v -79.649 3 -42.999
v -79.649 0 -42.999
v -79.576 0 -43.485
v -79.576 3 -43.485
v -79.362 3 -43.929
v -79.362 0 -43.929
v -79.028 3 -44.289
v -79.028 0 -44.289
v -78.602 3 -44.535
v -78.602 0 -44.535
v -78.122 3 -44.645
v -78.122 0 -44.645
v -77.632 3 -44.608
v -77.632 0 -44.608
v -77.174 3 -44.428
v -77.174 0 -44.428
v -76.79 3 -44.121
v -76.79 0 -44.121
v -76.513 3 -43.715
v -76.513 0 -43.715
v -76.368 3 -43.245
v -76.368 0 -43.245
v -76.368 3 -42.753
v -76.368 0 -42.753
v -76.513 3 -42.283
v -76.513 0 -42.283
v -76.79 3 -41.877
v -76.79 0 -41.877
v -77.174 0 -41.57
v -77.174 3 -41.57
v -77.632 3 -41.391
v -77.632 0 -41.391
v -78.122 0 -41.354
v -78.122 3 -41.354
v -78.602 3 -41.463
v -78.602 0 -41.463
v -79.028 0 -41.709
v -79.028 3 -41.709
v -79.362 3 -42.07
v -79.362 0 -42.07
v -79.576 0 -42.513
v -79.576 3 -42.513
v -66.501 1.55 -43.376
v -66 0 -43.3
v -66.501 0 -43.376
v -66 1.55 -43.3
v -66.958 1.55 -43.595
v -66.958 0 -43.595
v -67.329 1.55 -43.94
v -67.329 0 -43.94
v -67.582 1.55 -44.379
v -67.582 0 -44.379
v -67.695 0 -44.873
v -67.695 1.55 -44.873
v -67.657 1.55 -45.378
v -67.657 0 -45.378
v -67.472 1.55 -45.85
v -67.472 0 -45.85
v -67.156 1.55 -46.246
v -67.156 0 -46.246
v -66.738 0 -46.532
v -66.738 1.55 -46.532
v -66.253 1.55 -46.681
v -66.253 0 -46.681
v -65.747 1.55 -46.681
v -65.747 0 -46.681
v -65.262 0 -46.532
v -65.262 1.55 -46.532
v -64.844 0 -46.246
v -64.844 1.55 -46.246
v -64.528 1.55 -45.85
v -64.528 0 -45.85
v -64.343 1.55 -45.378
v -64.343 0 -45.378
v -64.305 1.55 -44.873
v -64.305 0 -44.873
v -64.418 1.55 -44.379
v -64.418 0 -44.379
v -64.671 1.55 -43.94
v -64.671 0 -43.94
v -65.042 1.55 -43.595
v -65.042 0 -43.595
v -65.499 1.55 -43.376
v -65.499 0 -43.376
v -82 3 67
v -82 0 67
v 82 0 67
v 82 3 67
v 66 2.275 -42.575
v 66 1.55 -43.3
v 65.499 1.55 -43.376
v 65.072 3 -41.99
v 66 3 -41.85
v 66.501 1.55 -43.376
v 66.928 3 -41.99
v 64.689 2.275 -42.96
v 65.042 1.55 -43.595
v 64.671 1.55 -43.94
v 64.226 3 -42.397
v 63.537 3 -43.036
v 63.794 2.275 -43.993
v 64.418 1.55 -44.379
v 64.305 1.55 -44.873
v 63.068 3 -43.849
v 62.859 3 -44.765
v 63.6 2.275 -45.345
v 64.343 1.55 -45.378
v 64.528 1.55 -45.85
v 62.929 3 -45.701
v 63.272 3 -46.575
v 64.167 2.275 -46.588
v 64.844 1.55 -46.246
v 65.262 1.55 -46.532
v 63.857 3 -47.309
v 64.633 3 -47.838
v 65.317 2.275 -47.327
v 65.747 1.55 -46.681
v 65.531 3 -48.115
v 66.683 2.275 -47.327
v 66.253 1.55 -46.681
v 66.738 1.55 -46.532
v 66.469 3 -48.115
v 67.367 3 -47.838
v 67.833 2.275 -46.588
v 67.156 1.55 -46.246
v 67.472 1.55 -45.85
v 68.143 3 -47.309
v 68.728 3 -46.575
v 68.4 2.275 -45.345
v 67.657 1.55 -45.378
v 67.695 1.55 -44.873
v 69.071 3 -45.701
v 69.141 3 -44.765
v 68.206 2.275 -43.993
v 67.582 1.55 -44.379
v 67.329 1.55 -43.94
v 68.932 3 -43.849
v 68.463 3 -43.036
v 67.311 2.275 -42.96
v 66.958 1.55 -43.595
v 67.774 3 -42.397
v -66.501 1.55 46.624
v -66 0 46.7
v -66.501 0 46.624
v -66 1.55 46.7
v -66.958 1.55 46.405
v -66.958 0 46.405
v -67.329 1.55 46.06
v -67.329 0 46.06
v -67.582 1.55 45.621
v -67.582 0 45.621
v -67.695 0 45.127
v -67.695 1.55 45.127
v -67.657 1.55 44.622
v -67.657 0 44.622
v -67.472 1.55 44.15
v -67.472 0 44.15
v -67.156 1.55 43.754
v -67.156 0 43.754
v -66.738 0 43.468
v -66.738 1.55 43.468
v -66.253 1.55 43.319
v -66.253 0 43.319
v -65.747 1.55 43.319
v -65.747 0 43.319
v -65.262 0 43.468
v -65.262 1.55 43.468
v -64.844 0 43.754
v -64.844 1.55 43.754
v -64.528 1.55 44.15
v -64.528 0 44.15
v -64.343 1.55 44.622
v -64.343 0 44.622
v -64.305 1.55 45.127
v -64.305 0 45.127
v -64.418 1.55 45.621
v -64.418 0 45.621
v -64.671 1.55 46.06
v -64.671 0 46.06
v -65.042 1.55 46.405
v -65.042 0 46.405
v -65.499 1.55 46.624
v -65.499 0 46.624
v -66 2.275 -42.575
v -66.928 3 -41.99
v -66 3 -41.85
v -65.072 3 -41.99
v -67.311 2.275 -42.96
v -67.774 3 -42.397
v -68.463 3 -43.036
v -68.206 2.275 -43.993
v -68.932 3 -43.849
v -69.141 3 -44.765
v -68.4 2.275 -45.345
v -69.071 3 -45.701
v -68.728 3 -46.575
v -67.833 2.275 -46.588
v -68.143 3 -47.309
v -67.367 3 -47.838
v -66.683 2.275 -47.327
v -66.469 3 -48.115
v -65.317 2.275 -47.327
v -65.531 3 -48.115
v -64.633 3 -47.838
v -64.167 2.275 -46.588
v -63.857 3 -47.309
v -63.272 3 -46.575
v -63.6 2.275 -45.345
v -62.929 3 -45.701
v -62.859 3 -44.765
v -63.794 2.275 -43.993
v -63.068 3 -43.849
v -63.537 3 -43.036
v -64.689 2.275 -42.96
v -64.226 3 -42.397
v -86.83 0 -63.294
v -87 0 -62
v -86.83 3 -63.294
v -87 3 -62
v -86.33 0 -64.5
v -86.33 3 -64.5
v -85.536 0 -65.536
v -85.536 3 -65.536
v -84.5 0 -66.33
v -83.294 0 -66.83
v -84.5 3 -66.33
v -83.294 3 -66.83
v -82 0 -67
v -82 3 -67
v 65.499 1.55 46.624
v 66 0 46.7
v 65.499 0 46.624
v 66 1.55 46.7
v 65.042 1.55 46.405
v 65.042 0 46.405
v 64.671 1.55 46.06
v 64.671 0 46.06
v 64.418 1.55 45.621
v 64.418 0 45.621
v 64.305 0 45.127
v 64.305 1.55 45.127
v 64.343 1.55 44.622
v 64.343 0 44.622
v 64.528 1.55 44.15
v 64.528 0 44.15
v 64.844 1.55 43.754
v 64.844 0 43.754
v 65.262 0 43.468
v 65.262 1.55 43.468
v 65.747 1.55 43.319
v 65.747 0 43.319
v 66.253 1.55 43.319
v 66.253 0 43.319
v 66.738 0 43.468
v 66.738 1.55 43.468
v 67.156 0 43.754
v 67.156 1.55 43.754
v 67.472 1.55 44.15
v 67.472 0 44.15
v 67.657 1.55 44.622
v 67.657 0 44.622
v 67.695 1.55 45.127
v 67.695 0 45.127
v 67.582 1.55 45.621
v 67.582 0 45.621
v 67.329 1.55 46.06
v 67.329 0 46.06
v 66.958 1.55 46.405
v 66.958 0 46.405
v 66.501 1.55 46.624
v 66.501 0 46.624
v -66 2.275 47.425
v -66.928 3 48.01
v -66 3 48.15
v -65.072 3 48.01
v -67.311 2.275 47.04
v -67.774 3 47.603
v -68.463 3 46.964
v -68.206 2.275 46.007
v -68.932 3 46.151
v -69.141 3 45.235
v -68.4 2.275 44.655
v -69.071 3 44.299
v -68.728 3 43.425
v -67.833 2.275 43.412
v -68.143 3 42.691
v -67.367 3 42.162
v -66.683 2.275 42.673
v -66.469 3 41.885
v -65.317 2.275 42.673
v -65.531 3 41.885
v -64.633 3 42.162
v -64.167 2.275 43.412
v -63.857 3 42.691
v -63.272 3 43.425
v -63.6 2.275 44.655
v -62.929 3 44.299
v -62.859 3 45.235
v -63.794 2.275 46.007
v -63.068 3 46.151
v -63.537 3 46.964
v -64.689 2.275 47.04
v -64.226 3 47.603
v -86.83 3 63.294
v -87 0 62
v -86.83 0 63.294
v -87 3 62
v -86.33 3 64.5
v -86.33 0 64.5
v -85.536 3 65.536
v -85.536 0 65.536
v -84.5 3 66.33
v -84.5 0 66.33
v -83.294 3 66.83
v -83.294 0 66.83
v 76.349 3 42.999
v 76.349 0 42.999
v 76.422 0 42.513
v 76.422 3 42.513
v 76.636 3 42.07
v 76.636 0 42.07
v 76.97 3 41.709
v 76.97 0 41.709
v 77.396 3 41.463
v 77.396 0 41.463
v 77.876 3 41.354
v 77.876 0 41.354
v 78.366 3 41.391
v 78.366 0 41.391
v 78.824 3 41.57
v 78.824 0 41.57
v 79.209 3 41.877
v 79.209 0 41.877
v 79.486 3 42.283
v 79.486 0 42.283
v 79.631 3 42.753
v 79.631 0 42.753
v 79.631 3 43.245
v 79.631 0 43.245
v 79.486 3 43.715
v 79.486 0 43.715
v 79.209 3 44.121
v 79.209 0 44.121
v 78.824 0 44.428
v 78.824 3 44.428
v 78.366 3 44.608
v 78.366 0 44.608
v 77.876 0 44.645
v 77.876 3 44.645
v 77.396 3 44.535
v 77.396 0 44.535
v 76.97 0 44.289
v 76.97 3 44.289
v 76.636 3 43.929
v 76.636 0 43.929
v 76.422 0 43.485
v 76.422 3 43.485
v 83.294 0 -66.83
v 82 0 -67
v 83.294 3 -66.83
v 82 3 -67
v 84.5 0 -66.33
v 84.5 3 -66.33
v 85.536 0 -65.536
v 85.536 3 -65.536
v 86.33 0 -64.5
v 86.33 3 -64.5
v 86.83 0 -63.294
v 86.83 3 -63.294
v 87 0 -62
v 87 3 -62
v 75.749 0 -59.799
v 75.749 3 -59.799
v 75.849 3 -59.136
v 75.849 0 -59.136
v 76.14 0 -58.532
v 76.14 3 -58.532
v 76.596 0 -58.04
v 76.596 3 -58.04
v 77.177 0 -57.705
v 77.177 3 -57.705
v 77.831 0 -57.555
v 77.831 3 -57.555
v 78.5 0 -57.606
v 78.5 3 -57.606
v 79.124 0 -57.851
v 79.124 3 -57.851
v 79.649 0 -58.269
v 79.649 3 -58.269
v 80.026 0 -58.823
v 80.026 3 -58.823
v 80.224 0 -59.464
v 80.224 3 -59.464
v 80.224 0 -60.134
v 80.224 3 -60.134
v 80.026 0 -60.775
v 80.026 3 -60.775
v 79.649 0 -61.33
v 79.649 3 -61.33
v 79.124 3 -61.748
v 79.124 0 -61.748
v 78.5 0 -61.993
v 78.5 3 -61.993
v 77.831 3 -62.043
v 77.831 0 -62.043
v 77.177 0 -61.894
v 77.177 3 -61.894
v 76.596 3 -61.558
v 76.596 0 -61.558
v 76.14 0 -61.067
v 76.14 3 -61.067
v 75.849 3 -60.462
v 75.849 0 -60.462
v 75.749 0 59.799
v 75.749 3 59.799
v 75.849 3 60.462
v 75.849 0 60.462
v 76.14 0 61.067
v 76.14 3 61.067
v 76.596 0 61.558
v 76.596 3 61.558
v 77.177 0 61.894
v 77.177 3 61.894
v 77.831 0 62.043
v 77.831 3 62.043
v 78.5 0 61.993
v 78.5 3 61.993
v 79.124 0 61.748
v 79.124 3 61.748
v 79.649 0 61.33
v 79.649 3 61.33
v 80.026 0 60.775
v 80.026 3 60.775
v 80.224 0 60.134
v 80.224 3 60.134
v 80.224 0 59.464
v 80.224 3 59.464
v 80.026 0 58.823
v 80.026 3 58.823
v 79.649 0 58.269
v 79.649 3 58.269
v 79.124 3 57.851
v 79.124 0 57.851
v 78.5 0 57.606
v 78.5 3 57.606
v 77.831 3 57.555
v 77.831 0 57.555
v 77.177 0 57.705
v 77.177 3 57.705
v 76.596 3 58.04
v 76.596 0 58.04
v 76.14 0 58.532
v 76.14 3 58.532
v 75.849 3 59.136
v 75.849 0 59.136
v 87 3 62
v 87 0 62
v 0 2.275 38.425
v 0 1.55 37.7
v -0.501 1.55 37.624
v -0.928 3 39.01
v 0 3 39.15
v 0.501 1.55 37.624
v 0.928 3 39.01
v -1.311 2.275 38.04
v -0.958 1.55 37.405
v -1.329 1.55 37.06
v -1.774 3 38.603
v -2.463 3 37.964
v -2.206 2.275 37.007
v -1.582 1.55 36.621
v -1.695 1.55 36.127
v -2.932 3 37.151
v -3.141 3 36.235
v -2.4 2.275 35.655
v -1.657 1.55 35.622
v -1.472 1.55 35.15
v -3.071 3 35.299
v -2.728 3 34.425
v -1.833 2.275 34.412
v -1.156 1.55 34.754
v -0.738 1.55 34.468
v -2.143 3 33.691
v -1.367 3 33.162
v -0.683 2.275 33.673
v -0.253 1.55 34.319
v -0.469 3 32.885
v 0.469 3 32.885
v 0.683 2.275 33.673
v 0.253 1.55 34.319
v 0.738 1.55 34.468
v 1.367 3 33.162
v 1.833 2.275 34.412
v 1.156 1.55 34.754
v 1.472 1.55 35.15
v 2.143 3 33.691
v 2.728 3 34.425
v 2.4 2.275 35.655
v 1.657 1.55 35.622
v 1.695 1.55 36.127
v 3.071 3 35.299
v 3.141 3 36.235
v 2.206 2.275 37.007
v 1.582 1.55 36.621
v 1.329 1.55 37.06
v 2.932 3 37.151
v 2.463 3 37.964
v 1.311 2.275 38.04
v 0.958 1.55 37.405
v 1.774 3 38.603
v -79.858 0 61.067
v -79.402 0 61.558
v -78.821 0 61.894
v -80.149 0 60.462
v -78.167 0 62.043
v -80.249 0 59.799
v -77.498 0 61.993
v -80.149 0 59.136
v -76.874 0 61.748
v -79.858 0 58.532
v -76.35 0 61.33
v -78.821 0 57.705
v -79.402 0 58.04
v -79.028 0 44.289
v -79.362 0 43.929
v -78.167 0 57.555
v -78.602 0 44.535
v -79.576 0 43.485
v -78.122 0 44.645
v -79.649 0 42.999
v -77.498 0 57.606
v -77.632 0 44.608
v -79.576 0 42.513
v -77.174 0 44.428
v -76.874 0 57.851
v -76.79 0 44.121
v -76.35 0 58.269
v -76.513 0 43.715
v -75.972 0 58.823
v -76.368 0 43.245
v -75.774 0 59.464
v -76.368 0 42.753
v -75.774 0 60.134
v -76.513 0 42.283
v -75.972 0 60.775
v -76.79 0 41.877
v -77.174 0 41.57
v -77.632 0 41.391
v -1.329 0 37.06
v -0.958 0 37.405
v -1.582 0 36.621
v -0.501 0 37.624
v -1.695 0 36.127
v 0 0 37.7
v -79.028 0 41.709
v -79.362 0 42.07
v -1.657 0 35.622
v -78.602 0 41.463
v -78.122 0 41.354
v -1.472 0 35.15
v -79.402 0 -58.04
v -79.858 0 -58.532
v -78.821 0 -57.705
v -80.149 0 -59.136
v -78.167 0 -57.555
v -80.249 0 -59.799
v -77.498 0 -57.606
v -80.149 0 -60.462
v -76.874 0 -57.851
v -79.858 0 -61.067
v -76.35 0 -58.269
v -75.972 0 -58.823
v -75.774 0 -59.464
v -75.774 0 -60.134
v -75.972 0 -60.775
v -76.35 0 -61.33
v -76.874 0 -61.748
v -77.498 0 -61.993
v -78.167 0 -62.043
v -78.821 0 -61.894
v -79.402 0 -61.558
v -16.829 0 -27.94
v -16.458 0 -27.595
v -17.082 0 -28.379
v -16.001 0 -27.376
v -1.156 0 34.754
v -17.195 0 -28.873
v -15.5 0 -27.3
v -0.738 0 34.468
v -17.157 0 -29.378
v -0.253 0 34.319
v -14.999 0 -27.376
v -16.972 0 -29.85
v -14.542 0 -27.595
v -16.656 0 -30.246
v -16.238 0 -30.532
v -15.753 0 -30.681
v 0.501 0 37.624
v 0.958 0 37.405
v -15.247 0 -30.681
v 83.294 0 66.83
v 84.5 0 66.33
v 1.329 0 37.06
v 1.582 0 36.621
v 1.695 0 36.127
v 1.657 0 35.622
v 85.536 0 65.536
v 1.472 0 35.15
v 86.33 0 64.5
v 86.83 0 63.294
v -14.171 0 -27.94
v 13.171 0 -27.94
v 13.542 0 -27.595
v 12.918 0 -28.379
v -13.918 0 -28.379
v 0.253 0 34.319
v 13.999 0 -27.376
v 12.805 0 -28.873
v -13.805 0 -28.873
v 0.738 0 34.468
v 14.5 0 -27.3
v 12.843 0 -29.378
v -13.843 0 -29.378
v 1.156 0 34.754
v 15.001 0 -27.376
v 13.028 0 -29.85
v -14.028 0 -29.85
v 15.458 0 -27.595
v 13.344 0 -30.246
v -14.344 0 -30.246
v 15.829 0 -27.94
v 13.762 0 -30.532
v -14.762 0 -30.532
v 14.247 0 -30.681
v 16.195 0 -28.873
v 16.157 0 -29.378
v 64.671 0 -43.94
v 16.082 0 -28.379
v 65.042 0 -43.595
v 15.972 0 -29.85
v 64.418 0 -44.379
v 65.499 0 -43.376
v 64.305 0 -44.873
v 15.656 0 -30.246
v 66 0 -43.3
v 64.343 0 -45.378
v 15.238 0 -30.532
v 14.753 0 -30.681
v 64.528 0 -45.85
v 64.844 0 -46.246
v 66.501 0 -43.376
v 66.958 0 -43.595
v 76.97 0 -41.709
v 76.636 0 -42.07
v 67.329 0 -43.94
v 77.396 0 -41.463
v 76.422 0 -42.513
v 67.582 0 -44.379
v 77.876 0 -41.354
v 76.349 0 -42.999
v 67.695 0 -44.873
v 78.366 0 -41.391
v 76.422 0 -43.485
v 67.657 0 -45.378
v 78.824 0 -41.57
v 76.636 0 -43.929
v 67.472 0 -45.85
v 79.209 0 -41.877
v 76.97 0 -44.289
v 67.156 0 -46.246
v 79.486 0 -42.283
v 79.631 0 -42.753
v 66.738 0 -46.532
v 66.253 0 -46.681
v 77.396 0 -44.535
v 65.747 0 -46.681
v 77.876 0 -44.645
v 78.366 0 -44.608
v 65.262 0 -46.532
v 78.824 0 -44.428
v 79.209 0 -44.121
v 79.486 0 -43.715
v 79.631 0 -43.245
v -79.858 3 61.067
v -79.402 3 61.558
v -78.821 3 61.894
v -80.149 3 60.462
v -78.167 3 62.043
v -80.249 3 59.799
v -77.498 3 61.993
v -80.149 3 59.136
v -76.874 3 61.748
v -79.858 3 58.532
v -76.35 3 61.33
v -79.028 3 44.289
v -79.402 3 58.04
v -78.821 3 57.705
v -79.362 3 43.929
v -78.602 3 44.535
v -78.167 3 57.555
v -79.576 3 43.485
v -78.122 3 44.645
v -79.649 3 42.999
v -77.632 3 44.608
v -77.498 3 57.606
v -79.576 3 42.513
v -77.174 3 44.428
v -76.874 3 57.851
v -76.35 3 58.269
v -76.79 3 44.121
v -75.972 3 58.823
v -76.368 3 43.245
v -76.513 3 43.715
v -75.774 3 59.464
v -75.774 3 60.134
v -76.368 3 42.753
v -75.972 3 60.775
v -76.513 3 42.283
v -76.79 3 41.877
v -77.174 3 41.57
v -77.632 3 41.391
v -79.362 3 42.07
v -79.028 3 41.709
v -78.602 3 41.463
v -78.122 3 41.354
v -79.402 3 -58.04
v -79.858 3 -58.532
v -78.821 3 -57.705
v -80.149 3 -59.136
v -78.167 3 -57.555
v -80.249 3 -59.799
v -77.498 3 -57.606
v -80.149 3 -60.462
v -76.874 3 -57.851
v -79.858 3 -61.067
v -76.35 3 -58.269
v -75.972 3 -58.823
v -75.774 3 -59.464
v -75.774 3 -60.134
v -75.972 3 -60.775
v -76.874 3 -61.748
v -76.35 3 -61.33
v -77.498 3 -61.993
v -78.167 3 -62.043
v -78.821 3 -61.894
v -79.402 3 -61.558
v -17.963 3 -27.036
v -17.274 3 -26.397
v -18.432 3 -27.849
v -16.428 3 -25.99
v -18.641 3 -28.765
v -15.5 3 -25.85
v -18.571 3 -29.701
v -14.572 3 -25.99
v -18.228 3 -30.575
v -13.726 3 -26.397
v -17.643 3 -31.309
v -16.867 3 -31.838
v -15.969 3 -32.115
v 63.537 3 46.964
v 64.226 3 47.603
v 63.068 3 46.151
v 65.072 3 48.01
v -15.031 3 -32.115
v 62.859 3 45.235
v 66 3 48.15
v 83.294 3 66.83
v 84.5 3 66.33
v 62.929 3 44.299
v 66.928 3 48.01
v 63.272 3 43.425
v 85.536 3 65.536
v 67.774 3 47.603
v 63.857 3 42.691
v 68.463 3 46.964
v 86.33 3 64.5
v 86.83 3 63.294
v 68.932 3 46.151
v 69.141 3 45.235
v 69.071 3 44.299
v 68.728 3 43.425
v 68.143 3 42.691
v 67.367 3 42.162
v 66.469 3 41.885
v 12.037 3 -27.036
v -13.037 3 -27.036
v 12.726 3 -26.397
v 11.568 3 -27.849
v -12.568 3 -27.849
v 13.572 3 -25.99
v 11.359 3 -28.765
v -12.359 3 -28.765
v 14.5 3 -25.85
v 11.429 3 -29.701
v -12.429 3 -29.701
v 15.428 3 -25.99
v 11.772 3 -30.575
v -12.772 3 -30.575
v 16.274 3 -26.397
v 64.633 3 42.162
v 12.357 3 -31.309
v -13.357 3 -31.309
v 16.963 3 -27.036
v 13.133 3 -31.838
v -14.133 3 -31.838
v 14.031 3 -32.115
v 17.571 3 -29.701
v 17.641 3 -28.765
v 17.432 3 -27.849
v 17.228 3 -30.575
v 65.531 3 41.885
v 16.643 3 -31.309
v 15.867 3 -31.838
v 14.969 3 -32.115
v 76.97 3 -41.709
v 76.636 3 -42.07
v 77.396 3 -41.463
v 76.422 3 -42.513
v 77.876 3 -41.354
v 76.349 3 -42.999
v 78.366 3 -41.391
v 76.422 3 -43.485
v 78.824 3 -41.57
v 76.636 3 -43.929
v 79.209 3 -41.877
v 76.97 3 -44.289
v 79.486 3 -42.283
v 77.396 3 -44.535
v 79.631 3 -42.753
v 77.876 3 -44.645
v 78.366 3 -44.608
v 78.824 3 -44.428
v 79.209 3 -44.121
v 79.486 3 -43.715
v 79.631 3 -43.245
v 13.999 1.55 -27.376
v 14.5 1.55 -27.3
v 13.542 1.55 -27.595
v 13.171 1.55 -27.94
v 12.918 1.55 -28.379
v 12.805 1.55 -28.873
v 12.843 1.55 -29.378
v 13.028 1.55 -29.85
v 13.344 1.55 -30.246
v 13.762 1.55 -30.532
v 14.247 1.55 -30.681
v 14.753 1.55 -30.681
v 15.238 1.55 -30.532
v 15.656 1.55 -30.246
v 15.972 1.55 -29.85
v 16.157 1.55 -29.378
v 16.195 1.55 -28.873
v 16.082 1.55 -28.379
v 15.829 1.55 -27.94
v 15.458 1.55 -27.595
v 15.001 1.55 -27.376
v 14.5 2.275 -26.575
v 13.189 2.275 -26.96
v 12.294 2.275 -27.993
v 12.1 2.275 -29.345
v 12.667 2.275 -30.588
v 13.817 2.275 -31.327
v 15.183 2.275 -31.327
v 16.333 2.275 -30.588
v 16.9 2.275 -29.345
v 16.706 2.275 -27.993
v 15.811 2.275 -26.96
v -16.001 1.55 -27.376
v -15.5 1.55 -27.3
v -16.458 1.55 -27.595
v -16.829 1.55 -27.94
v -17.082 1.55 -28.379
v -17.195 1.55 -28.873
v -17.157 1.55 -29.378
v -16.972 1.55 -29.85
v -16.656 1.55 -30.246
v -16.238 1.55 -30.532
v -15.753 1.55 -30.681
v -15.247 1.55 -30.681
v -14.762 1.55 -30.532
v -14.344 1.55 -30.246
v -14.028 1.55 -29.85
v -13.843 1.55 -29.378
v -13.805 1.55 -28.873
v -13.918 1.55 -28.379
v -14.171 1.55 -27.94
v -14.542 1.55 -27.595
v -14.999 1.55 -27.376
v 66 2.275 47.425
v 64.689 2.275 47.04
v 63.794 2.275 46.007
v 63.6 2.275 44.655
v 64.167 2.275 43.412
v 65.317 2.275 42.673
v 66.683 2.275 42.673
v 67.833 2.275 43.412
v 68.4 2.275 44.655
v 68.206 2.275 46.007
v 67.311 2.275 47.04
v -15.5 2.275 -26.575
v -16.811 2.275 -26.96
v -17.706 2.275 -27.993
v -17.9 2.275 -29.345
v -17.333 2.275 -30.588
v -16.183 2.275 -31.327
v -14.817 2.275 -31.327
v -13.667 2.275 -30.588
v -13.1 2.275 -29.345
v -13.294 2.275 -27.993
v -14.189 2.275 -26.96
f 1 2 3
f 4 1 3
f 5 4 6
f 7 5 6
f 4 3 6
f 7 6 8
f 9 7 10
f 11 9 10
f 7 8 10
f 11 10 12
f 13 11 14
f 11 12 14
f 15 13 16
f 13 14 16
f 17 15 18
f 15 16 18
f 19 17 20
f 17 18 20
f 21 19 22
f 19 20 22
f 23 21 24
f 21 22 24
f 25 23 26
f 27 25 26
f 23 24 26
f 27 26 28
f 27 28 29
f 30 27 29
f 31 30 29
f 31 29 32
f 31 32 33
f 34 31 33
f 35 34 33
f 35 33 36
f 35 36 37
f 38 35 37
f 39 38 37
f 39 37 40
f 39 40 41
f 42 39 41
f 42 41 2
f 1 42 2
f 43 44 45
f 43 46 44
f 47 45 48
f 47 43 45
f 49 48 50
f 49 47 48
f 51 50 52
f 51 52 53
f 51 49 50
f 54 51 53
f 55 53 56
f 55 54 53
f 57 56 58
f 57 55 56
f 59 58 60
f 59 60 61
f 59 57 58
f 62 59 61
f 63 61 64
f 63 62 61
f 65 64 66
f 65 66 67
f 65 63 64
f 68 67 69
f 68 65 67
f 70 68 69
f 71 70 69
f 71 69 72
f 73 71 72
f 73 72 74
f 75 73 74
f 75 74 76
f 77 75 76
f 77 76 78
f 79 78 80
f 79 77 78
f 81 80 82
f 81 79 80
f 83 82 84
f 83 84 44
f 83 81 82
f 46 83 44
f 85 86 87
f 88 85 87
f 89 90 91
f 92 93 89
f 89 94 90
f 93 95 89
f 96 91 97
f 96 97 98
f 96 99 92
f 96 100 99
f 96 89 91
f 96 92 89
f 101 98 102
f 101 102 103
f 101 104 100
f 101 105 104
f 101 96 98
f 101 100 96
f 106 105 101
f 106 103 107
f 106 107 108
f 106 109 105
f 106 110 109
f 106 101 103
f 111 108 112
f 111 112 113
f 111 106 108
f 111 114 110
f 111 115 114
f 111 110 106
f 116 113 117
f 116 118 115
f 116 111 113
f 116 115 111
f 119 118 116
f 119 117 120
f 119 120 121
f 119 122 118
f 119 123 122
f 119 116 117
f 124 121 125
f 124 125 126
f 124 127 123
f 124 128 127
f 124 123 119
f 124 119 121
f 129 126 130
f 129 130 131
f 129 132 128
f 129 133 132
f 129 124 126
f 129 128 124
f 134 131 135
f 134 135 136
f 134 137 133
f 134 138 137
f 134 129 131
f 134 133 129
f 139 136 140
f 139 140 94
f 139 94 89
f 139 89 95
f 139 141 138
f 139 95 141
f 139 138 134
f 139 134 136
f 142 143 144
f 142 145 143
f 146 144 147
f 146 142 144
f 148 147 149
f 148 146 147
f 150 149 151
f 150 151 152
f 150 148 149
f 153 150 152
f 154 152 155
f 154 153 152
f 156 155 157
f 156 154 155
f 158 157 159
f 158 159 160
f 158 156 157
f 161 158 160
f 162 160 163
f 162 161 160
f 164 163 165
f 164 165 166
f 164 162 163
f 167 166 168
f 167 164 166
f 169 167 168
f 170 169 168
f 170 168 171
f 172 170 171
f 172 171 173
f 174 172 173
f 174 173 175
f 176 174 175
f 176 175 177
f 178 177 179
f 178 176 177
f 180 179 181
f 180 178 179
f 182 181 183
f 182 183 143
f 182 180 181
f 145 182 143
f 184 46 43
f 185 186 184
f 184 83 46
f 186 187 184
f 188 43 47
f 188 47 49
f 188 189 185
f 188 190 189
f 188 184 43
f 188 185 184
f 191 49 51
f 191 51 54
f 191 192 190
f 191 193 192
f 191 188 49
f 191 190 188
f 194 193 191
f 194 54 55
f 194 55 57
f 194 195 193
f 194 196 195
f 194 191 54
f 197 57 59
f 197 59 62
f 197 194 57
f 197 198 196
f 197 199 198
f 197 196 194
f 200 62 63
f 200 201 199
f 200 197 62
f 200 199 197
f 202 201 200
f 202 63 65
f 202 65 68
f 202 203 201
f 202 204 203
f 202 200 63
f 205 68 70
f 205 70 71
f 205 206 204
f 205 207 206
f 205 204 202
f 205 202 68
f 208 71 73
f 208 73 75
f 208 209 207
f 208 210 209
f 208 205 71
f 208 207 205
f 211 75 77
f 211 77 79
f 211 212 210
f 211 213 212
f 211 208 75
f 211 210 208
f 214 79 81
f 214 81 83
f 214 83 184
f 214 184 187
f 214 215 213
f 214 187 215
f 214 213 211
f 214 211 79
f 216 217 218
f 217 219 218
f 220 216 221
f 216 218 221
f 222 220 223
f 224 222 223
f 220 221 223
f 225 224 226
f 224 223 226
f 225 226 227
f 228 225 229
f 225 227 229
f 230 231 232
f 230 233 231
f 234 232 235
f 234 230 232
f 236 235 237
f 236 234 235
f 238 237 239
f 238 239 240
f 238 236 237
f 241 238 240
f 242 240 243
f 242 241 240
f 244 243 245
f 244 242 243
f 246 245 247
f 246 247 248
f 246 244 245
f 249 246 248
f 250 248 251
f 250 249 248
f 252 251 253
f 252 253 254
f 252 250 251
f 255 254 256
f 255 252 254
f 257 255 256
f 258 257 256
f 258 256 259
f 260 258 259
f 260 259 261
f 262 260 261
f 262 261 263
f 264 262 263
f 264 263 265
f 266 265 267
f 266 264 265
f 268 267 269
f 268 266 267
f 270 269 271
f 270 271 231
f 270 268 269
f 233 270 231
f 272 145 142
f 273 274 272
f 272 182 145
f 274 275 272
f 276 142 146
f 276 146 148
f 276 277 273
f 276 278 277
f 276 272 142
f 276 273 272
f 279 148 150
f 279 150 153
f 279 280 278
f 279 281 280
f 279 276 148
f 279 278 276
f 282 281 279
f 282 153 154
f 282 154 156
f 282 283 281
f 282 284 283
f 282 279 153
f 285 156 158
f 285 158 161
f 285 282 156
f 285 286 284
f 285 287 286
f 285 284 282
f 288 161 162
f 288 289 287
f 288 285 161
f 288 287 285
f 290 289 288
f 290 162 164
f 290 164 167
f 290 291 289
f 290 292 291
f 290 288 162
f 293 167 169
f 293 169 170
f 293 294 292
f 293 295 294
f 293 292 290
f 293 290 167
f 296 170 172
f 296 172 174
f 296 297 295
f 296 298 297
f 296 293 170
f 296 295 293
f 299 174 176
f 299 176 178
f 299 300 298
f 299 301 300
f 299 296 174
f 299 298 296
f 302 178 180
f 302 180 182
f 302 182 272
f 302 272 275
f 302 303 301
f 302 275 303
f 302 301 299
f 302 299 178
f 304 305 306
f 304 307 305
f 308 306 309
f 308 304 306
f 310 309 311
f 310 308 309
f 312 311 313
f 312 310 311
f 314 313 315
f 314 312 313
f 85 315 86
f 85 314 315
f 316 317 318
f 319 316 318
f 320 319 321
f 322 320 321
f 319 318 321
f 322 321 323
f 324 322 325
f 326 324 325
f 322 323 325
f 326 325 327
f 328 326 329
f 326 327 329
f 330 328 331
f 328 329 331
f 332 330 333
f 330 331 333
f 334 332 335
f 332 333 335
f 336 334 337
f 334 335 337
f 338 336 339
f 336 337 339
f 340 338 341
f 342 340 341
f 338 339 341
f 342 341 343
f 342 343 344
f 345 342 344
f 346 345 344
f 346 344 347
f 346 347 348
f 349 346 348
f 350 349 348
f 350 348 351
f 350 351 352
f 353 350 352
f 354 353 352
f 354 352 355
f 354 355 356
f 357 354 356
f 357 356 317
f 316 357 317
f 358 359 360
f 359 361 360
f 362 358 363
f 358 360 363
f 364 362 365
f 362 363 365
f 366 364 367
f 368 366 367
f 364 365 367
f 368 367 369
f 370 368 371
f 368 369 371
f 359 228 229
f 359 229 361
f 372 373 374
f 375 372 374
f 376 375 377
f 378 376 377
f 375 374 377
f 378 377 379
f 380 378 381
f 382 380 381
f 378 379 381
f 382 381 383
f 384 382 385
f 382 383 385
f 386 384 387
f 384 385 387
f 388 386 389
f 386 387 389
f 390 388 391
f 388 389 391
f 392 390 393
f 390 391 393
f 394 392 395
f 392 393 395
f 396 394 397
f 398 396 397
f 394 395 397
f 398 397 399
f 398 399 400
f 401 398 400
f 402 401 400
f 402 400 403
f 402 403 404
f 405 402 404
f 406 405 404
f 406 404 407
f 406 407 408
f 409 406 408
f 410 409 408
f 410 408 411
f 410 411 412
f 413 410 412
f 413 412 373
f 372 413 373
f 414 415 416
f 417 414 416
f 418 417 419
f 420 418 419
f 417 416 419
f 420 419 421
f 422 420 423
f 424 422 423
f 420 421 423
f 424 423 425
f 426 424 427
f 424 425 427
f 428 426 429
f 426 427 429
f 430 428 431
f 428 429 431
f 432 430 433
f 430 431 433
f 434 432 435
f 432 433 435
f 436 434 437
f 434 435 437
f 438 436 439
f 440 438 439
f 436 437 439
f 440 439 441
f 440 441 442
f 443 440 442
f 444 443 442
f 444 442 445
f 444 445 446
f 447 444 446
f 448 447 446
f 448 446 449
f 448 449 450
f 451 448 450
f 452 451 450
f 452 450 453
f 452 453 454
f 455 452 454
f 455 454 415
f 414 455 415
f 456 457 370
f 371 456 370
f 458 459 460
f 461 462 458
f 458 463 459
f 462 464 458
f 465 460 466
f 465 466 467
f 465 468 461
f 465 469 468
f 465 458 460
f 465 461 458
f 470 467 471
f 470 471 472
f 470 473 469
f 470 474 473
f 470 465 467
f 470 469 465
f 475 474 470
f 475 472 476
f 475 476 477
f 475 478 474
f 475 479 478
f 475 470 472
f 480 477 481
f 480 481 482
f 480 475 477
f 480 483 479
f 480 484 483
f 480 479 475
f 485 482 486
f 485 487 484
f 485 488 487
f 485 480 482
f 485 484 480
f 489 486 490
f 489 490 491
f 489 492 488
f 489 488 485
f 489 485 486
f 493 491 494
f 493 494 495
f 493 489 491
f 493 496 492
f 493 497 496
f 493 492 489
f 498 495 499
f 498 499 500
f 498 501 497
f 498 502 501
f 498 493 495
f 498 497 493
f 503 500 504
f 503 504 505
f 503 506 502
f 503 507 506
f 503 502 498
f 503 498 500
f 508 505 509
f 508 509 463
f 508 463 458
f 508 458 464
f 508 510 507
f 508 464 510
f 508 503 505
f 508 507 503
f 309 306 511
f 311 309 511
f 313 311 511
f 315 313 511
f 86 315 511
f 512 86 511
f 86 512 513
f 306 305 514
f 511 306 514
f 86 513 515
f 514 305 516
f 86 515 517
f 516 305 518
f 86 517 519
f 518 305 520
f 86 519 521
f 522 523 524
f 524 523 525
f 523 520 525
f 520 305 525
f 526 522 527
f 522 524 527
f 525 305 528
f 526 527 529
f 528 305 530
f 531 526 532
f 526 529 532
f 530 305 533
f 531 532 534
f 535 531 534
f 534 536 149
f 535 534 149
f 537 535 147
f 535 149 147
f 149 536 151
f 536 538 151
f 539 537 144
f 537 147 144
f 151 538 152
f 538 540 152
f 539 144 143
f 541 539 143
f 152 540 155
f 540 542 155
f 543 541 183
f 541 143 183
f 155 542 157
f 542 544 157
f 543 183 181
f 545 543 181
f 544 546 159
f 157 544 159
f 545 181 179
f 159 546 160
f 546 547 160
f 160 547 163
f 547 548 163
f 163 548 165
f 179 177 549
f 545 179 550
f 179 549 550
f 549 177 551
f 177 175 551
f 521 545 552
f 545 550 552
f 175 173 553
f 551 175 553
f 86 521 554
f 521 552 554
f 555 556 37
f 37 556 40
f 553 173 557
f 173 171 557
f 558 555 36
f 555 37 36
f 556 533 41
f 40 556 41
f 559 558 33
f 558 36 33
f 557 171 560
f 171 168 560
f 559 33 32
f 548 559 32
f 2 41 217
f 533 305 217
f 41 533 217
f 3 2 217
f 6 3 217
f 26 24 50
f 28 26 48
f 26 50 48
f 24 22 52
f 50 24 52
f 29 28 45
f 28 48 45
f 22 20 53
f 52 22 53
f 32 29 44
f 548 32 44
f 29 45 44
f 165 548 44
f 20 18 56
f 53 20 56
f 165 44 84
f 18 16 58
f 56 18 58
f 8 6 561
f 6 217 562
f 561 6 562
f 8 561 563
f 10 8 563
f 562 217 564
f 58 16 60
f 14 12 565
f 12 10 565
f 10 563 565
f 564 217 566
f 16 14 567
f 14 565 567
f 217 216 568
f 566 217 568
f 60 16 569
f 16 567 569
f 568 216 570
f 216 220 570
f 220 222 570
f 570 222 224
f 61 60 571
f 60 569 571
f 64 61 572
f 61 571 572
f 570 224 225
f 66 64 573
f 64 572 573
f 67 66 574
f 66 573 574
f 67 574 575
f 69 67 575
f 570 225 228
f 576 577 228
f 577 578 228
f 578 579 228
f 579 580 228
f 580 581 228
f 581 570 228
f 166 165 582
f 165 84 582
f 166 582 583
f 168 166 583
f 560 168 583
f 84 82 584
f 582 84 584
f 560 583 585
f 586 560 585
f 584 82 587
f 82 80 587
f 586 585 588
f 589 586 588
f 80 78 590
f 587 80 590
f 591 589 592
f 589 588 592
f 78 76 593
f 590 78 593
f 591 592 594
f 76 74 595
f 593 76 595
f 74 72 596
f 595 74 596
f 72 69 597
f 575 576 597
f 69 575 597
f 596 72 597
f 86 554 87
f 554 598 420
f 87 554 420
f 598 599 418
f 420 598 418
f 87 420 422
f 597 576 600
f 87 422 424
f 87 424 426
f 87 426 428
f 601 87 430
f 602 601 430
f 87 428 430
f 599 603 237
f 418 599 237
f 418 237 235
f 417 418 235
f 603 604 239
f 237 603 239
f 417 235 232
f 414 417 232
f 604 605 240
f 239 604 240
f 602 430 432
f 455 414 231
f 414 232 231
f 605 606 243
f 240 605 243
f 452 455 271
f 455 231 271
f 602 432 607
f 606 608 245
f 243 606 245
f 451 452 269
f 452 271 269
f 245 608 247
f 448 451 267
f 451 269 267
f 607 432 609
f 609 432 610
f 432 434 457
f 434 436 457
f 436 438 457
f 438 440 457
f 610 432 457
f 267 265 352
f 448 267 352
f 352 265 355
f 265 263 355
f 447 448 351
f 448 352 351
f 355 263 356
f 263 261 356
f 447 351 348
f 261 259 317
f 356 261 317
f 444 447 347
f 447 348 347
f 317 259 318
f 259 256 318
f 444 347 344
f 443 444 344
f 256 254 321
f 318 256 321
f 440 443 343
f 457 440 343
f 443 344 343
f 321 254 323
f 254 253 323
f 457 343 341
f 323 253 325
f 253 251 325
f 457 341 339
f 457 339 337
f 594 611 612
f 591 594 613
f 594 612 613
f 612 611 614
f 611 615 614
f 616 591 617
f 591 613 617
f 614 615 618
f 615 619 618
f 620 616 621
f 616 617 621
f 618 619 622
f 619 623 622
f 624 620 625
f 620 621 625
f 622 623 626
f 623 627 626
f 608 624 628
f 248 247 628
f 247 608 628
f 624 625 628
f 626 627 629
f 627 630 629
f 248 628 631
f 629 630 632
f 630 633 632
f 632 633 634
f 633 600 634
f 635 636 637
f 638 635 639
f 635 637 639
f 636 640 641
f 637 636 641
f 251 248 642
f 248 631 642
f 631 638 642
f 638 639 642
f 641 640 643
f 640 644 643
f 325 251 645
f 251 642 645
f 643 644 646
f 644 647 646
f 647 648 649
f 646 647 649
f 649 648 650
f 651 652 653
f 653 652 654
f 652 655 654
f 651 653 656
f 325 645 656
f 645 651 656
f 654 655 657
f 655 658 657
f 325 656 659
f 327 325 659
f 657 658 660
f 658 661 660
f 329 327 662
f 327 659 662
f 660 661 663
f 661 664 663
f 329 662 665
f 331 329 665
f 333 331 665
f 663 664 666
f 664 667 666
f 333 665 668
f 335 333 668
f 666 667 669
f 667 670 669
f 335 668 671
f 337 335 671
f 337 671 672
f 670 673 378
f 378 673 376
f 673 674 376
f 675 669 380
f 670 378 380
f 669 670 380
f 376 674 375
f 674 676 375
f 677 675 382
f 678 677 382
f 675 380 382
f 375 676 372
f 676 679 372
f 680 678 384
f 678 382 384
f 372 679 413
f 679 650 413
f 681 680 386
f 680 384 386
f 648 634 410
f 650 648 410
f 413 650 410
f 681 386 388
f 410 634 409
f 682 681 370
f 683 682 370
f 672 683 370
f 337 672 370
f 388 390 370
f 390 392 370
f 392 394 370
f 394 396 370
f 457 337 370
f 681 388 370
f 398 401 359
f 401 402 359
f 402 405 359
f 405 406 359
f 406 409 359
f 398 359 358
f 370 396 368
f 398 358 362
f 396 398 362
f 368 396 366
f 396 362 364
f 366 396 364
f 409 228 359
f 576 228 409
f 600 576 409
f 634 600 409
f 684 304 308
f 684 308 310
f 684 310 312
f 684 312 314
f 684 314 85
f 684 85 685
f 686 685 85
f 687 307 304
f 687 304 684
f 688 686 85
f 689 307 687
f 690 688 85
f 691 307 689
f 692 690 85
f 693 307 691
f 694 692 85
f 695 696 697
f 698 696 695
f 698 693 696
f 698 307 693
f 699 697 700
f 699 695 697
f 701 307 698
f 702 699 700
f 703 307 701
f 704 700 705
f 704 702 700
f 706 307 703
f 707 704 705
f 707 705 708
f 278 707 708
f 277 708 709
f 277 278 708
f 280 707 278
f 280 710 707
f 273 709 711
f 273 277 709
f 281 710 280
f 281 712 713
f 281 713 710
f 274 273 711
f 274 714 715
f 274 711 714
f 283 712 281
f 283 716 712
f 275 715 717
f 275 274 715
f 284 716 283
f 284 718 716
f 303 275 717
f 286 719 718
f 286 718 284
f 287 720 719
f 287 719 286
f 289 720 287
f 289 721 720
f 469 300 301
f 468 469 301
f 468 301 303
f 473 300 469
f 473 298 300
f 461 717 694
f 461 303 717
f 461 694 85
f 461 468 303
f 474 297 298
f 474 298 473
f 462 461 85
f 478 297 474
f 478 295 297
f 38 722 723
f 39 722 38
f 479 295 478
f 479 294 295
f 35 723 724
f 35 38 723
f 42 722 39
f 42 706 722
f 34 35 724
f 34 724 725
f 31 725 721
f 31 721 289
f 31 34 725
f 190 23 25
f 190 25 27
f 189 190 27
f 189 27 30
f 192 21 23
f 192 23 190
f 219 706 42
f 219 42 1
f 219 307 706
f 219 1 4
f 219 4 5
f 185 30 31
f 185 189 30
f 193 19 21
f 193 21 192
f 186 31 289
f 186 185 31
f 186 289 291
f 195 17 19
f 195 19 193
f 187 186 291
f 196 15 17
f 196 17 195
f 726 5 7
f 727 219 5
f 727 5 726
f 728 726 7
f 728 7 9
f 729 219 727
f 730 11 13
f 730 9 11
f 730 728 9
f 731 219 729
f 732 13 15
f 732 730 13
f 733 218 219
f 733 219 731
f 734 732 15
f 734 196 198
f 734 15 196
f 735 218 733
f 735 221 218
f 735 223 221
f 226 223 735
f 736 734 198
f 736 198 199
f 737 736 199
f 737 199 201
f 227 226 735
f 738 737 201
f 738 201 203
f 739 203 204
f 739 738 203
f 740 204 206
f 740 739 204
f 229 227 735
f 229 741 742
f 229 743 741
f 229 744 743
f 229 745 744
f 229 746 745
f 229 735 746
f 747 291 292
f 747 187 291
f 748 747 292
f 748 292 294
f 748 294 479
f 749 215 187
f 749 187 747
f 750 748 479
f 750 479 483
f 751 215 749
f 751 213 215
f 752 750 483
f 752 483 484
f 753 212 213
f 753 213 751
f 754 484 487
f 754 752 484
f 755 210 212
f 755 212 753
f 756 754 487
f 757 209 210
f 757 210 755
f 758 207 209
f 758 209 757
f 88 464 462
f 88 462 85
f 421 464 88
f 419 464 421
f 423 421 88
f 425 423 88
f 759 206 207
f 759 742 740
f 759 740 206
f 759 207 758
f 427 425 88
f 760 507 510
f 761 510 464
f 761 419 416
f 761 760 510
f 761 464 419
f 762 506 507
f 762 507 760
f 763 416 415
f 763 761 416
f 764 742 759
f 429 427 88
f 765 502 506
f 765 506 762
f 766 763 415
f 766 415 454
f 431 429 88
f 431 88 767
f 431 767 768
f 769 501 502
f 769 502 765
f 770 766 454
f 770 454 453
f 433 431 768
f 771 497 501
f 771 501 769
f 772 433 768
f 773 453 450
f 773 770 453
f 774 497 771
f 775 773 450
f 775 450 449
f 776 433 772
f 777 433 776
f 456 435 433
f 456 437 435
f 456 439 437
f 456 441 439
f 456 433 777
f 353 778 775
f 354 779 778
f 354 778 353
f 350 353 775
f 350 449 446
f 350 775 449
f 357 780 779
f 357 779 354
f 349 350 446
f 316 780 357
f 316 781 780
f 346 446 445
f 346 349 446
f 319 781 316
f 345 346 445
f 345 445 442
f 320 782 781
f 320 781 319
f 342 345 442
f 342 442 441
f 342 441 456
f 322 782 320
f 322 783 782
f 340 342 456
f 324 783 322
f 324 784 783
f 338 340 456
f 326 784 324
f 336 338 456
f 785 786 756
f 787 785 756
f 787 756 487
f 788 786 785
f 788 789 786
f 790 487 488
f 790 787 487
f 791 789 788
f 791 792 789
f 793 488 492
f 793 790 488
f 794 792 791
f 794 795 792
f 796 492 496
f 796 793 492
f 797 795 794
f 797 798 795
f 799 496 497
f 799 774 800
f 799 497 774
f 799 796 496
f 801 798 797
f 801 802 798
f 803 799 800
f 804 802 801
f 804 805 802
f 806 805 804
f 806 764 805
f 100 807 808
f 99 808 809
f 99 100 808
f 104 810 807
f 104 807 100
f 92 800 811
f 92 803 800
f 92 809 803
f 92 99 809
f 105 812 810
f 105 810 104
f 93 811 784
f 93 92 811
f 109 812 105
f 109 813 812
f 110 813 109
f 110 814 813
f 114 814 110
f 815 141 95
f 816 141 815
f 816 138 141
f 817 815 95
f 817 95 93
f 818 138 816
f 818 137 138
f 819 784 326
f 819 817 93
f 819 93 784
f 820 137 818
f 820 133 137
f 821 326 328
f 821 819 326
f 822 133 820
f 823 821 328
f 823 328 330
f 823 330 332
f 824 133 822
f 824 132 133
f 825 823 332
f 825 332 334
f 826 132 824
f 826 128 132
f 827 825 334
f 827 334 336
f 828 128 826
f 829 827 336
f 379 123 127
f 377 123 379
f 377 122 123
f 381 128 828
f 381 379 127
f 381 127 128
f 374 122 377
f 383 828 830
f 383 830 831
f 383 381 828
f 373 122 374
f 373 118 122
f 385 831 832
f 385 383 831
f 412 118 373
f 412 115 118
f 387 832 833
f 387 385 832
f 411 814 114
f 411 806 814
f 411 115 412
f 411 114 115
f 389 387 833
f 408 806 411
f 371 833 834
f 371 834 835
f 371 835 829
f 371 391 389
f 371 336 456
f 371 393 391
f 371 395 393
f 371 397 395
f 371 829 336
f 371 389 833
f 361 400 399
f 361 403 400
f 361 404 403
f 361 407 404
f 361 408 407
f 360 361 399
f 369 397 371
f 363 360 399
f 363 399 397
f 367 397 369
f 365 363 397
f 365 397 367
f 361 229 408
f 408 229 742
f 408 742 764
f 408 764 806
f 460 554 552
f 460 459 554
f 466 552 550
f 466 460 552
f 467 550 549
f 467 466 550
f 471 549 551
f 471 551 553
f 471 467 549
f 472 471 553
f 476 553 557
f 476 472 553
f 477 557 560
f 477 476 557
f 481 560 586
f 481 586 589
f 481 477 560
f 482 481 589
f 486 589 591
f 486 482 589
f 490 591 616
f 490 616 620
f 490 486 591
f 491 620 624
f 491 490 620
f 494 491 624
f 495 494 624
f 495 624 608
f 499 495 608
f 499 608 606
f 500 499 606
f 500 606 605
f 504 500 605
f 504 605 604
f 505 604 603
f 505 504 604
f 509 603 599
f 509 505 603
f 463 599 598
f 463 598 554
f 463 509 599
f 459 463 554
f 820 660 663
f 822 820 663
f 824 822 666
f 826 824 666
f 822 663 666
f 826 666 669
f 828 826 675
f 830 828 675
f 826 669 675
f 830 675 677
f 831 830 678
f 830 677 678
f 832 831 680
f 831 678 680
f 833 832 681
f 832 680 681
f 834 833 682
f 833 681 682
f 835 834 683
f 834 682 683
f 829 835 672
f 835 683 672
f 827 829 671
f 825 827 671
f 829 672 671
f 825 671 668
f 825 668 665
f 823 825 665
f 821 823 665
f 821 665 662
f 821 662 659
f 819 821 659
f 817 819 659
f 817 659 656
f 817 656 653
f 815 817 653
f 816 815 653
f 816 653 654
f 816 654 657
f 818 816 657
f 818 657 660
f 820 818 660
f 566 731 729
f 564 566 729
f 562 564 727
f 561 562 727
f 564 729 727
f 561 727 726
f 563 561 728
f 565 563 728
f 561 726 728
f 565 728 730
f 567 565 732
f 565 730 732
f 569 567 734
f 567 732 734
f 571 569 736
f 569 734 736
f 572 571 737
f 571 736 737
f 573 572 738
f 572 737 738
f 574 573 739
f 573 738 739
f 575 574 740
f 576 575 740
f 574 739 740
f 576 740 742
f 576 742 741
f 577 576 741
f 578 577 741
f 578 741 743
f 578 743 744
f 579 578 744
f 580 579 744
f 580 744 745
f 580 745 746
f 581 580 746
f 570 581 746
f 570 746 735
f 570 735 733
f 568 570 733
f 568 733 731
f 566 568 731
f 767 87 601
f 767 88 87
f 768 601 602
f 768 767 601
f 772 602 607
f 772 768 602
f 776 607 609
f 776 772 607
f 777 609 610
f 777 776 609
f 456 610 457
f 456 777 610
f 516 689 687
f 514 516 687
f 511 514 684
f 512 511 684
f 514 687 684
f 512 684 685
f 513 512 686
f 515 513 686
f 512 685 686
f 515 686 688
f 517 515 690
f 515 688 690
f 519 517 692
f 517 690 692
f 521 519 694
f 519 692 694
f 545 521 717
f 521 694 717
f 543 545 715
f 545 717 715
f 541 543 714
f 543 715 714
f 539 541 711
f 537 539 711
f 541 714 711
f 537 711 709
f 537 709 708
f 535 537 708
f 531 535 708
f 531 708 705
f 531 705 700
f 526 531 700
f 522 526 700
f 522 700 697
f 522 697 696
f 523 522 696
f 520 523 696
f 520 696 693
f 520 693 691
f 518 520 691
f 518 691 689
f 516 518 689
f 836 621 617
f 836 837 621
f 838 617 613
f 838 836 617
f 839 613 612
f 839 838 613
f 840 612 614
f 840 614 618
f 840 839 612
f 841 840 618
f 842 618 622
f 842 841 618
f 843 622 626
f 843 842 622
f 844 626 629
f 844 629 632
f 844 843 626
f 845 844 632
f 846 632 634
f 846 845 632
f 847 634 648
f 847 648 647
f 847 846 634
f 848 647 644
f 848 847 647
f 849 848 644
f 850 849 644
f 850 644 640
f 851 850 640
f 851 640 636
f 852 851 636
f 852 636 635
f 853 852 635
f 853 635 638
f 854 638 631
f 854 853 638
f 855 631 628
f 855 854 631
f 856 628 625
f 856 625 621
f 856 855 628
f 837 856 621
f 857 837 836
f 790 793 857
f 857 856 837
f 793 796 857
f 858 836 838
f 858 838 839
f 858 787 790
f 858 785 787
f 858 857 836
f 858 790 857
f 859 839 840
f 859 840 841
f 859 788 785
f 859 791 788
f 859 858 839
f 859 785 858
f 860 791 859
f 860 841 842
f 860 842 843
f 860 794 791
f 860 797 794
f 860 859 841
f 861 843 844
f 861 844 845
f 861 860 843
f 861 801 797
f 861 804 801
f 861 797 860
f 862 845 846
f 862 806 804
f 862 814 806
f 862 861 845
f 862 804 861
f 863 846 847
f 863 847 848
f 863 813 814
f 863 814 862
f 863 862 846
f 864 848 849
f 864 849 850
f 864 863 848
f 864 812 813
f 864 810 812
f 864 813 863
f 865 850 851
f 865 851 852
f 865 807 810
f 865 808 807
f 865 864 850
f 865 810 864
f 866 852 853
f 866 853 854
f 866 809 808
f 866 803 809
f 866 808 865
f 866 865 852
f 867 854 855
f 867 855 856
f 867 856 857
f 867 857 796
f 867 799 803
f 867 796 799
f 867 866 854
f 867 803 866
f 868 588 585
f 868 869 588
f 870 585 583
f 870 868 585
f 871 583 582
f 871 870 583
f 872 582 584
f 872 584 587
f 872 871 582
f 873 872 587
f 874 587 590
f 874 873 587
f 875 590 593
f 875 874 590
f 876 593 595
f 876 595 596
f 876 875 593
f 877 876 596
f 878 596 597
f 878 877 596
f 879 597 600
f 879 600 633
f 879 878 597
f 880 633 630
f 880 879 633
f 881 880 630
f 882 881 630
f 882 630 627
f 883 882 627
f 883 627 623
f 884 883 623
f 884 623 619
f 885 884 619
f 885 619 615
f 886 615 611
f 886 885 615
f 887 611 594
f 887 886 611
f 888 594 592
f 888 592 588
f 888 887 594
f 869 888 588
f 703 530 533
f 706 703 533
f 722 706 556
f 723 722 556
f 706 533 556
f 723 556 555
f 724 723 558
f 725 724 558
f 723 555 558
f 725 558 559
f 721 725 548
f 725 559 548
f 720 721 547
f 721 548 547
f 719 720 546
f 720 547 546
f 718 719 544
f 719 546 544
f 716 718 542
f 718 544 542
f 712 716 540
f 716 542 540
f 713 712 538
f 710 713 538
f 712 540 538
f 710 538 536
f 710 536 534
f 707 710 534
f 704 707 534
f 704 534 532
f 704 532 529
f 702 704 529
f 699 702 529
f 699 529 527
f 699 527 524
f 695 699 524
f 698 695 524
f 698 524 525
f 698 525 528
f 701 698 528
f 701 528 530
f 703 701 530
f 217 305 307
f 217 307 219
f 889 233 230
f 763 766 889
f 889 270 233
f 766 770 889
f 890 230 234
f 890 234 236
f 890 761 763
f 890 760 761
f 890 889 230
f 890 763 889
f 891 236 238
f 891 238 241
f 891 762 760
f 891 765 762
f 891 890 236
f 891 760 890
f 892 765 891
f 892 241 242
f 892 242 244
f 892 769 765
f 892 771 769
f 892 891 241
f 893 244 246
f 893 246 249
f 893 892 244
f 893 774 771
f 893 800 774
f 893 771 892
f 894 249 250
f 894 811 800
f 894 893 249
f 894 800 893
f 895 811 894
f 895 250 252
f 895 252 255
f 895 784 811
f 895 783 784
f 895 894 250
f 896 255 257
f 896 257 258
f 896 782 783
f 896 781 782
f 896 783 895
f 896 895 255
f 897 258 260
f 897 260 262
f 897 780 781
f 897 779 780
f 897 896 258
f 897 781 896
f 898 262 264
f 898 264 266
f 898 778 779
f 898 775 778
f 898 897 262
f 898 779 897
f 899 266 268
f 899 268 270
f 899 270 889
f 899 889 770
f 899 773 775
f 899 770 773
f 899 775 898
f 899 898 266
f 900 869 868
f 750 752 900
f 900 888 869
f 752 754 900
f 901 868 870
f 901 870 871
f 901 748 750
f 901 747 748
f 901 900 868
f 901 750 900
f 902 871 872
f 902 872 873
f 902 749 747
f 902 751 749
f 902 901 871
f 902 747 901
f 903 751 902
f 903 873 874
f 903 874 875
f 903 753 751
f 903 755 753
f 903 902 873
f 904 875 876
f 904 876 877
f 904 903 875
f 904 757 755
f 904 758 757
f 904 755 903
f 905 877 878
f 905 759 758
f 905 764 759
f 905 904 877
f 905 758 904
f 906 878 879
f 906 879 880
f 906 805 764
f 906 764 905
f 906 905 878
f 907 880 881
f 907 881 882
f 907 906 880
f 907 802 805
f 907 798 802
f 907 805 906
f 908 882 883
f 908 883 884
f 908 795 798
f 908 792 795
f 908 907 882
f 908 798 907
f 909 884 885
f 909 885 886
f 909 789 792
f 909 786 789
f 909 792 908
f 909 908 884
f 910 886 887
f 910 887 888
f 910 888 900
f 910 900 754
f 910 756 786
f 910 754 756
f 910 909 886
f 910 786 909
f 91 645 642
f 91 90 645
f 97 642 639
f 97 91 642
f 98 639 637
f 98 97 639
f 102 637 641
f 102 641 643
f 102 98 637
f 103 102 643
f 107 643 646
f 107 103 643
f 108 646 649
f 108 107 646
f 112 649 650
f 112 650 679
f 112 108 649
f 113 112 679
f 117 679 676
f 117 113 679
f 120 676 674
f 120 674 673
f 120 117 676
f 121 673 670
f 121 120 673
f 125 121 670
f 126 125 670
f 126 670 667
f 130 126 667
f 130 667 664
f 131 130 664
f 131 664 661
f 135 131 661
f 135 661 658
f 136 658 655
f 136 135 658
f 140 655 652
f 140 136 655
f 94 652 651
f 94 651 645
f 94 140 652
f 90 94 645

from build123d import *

# Parameters (mm, degrees)
SKETCH1_W                                    = 174
SKETCH1_H                                    = 134
BOSS_EXTRUDE1_DEPTH                          = 3
ASSEM71_D                                    = 3.3
FILLET1_R                                    = 5
CSK_FOR_M3_COUNTERSUNK_FLAT_HEAD_SCR_2_COUNT = 2
CSK_FOR_M3_COUNTERSUNK_FLAT_HEAD_SCR_2_PITCH = 132
CSK_FOR_M3_COUNTERSUNK_FLAT_HEAD_SCR_3_COUNT = 2
CSK_FOR_M3_COUNTERSUNK_FLAT_HEAD_SCR_3_PITCH = 90
CSK_FOR_M3_COUNTERSUNK_FLAT_HEAD_SCR_4_COUNT = 2
CSK_FOR_M3_COUNTERSUNK_FLAT_HEAD_SCR_4_PITCH = 159.762323468
CSK_FOR_M3_COUNTERSUNK_FLAT_HEAD_SCR_5_COUNT = 2
CSK_FOR_M3_COUNTERSUNK_FLAT_HEAD_SCR_5_PITCH = 66.597672632
CSK_FOR_M3_COUNTERSUNK_FLAT_HEAD_SCR_6_COUNT = 2
CSK_FOR_M3_COUNTERSUNK_FLAT_HEAD_SCR_6_PITCH = 66.822526142
M4_CLEARANCE_HOLE1_D                         = 4.5


with BuildPart() as part:
    # Sketch1 → Boss-Extrude1 (new body)
    with BuildSketch(Plane(origin=(0, 0, 0), x_dir=(1, 0, 0), z_dir=(0, 1, 0))):
        Rectangle(SKETCH1_W, SKETCH1_H)
    extrude(amount=BOSS_EXTRUDE1_DEPTH)

    # Assem71 (through all)
    with Locations(Plane(origin=(0, 3, 0), x_dir=(1, 0, 0), z_dir=(0, 1, 0))):
        with Locations((-77.999137931, 42.999137931), (77.999137931, 42.999137931), (77.999137931, -42.999137931), (-77.999137931, -42.999137931), (-77.999137931, 59.799137931), (-77.999137931, -59.799137931), (77.999137931, 59.799137931), (77.999137931, -59.799137931)):
            Hole(ASSEM71_D / 2)

    # Fillet1
    fillet1_edges = [part.edges().sort_by_distance(p)[0] for p in [
        (-87, 1.5, -67),
        (87, 1.5, -67),
        (87, 1.5, 67),
        (-87, 1.5, 67),
    ]]
    fillet(fillet1_edges, radius=FILLET1_R)

    # Sketch6 → CSK for M3 Countersunk Flat Head Screw1 (revolve, cut)
    with BuildSketch(Plane(origin=(-66, 3, -45), x_dir=(0, 0, 1), z_dir=(1, 0, 0))):
        Polygon((0, 0), (0, 3), (1.7, 3), (1.7, 1.45), (3.15, 0), align=None)
    csk_for_m3_countersunk_flat_head_screw1 = revolve(axis=Axis((-66, 9.35, -45), (0, -1, 0)), mode=Mode.SUBTRACT)

    # CSK for M3 Countersunk Flat Head Scr 2: CSK for M3 Countersunk Flat Head Screw1 ×2
    with Locations(*[(i * CSK_FOR_M3_COUNTERSUNK_FLAT_HEAD_SCR_2_PITCH, 0, 0) for i in range(1, CSK_FOR_M3_COUNTERSUNK_FLAT_HEAD_SCR_2_COUNT)]):
        add(csk_for_m3_countersunk_flat_head_screw1, mode=Mode.SUBTRACT)

    # CSK for M3 Countersunk Flat Head Scr 3: CSK for M3 Countersunk Flat Head Screw1 ×2
    with Locations(*[(0, 0, i * CSK_FOR_M3_COUNTERSUNK_FLAT_HEAD_SCR_3_PITCH) for i in range(1, CSK_FOR_M3_COUNTERSUNK_FLAT_HEAD_SCR_3_COUNT)]):
        add(csk_for_m3_countersunk_flat_head_screw1, mode=Mode.SUBTRACT)

    # CSK for M3 Countersunk Flat Head Scr 4: CSK for M3 Countersunk Flat Head Screw1 ×2
    with Locations(*[Vector(0.826227343, 0, 0.563336825) * (i * CSK_FOR_M3_COUNTERSUNK_FLAT_HEAD_SCR_4_PITCH) for i in range(1, CSK_FOR_M3_COUNTERSUNK_FLAT_HEAD_SCR_4_COUNT)]):
        add(csk_for_m3_countersunk_flat_head_screw1, mode=Mode.SUBTRACT)

    # Sketch8 → CSK for M3 Countersunk Flat Head Screw2 (revolve, cut)
    with BuildSketch(Plane(origin=(0, 3, 36), x_dir=(0, 0, 1), z_dir=(1, 0, 0))):
        Polygon((0, 0), (0, 3), (1.7, 3), (1.7, 1.45), (3.15, 0), align=None)
    csk_for_m3_countersunk_flat_head_screw2 = revolve(axis=Axis((0, 9.35, 36), (0, -1, 0)), mode=Mode.SUBTRACT)

    # CSK for M3 Countersunk Flat Head Scr 5: CSK for M3 Countersunk Flat Head Screw2 ×2
    with Locations(*[Vector(0.217725326, 0, -0.976010083) * (i * CSK_FOR_M3_COUNTERSUNK_FLAT_HEAD_SCR_5_PITCH) for i in range(1, CSK_FOR_M3_COUNTERSUNK_FLAT_HEAD_SCR_5_COUNT)]):
        add(csk_for_m3_countersunk_flat_head_screw2, mode=Mode.SUBTRACT)

    # CSK for M3 Countersunk Flat Head Scr 6: CSK for M3 Countersunk Flat Head Screw2 ×2
    with Locations(*[Vector(-0.231957708, 0, -0.972725872) * (i * CSK_FOR_M3_COUNTERSUNK_FLAT_HEAD_SCR_6_PITCH) for i in range(1, CSK_FOR_M3_COUNTERSUNK_FLAT_HEAD_SCR_6_COUNT)]):
        add(csk_for_m3_countersunk_flat_head_screw2, mode=Mode.SUBTRACT)

    # M4 Clearance Hole1 (through all)
    with Locations(Plane.XZ):
        with Locations((-77.999137931, -59.799137931), (77.999137931, -59.799137931), (77.999137931, 59.799137931), (-77.999137931, 59.799137931)):
            Hole(M4_CLEARANCE_HOLE1_D / 2)


solid = part.part
